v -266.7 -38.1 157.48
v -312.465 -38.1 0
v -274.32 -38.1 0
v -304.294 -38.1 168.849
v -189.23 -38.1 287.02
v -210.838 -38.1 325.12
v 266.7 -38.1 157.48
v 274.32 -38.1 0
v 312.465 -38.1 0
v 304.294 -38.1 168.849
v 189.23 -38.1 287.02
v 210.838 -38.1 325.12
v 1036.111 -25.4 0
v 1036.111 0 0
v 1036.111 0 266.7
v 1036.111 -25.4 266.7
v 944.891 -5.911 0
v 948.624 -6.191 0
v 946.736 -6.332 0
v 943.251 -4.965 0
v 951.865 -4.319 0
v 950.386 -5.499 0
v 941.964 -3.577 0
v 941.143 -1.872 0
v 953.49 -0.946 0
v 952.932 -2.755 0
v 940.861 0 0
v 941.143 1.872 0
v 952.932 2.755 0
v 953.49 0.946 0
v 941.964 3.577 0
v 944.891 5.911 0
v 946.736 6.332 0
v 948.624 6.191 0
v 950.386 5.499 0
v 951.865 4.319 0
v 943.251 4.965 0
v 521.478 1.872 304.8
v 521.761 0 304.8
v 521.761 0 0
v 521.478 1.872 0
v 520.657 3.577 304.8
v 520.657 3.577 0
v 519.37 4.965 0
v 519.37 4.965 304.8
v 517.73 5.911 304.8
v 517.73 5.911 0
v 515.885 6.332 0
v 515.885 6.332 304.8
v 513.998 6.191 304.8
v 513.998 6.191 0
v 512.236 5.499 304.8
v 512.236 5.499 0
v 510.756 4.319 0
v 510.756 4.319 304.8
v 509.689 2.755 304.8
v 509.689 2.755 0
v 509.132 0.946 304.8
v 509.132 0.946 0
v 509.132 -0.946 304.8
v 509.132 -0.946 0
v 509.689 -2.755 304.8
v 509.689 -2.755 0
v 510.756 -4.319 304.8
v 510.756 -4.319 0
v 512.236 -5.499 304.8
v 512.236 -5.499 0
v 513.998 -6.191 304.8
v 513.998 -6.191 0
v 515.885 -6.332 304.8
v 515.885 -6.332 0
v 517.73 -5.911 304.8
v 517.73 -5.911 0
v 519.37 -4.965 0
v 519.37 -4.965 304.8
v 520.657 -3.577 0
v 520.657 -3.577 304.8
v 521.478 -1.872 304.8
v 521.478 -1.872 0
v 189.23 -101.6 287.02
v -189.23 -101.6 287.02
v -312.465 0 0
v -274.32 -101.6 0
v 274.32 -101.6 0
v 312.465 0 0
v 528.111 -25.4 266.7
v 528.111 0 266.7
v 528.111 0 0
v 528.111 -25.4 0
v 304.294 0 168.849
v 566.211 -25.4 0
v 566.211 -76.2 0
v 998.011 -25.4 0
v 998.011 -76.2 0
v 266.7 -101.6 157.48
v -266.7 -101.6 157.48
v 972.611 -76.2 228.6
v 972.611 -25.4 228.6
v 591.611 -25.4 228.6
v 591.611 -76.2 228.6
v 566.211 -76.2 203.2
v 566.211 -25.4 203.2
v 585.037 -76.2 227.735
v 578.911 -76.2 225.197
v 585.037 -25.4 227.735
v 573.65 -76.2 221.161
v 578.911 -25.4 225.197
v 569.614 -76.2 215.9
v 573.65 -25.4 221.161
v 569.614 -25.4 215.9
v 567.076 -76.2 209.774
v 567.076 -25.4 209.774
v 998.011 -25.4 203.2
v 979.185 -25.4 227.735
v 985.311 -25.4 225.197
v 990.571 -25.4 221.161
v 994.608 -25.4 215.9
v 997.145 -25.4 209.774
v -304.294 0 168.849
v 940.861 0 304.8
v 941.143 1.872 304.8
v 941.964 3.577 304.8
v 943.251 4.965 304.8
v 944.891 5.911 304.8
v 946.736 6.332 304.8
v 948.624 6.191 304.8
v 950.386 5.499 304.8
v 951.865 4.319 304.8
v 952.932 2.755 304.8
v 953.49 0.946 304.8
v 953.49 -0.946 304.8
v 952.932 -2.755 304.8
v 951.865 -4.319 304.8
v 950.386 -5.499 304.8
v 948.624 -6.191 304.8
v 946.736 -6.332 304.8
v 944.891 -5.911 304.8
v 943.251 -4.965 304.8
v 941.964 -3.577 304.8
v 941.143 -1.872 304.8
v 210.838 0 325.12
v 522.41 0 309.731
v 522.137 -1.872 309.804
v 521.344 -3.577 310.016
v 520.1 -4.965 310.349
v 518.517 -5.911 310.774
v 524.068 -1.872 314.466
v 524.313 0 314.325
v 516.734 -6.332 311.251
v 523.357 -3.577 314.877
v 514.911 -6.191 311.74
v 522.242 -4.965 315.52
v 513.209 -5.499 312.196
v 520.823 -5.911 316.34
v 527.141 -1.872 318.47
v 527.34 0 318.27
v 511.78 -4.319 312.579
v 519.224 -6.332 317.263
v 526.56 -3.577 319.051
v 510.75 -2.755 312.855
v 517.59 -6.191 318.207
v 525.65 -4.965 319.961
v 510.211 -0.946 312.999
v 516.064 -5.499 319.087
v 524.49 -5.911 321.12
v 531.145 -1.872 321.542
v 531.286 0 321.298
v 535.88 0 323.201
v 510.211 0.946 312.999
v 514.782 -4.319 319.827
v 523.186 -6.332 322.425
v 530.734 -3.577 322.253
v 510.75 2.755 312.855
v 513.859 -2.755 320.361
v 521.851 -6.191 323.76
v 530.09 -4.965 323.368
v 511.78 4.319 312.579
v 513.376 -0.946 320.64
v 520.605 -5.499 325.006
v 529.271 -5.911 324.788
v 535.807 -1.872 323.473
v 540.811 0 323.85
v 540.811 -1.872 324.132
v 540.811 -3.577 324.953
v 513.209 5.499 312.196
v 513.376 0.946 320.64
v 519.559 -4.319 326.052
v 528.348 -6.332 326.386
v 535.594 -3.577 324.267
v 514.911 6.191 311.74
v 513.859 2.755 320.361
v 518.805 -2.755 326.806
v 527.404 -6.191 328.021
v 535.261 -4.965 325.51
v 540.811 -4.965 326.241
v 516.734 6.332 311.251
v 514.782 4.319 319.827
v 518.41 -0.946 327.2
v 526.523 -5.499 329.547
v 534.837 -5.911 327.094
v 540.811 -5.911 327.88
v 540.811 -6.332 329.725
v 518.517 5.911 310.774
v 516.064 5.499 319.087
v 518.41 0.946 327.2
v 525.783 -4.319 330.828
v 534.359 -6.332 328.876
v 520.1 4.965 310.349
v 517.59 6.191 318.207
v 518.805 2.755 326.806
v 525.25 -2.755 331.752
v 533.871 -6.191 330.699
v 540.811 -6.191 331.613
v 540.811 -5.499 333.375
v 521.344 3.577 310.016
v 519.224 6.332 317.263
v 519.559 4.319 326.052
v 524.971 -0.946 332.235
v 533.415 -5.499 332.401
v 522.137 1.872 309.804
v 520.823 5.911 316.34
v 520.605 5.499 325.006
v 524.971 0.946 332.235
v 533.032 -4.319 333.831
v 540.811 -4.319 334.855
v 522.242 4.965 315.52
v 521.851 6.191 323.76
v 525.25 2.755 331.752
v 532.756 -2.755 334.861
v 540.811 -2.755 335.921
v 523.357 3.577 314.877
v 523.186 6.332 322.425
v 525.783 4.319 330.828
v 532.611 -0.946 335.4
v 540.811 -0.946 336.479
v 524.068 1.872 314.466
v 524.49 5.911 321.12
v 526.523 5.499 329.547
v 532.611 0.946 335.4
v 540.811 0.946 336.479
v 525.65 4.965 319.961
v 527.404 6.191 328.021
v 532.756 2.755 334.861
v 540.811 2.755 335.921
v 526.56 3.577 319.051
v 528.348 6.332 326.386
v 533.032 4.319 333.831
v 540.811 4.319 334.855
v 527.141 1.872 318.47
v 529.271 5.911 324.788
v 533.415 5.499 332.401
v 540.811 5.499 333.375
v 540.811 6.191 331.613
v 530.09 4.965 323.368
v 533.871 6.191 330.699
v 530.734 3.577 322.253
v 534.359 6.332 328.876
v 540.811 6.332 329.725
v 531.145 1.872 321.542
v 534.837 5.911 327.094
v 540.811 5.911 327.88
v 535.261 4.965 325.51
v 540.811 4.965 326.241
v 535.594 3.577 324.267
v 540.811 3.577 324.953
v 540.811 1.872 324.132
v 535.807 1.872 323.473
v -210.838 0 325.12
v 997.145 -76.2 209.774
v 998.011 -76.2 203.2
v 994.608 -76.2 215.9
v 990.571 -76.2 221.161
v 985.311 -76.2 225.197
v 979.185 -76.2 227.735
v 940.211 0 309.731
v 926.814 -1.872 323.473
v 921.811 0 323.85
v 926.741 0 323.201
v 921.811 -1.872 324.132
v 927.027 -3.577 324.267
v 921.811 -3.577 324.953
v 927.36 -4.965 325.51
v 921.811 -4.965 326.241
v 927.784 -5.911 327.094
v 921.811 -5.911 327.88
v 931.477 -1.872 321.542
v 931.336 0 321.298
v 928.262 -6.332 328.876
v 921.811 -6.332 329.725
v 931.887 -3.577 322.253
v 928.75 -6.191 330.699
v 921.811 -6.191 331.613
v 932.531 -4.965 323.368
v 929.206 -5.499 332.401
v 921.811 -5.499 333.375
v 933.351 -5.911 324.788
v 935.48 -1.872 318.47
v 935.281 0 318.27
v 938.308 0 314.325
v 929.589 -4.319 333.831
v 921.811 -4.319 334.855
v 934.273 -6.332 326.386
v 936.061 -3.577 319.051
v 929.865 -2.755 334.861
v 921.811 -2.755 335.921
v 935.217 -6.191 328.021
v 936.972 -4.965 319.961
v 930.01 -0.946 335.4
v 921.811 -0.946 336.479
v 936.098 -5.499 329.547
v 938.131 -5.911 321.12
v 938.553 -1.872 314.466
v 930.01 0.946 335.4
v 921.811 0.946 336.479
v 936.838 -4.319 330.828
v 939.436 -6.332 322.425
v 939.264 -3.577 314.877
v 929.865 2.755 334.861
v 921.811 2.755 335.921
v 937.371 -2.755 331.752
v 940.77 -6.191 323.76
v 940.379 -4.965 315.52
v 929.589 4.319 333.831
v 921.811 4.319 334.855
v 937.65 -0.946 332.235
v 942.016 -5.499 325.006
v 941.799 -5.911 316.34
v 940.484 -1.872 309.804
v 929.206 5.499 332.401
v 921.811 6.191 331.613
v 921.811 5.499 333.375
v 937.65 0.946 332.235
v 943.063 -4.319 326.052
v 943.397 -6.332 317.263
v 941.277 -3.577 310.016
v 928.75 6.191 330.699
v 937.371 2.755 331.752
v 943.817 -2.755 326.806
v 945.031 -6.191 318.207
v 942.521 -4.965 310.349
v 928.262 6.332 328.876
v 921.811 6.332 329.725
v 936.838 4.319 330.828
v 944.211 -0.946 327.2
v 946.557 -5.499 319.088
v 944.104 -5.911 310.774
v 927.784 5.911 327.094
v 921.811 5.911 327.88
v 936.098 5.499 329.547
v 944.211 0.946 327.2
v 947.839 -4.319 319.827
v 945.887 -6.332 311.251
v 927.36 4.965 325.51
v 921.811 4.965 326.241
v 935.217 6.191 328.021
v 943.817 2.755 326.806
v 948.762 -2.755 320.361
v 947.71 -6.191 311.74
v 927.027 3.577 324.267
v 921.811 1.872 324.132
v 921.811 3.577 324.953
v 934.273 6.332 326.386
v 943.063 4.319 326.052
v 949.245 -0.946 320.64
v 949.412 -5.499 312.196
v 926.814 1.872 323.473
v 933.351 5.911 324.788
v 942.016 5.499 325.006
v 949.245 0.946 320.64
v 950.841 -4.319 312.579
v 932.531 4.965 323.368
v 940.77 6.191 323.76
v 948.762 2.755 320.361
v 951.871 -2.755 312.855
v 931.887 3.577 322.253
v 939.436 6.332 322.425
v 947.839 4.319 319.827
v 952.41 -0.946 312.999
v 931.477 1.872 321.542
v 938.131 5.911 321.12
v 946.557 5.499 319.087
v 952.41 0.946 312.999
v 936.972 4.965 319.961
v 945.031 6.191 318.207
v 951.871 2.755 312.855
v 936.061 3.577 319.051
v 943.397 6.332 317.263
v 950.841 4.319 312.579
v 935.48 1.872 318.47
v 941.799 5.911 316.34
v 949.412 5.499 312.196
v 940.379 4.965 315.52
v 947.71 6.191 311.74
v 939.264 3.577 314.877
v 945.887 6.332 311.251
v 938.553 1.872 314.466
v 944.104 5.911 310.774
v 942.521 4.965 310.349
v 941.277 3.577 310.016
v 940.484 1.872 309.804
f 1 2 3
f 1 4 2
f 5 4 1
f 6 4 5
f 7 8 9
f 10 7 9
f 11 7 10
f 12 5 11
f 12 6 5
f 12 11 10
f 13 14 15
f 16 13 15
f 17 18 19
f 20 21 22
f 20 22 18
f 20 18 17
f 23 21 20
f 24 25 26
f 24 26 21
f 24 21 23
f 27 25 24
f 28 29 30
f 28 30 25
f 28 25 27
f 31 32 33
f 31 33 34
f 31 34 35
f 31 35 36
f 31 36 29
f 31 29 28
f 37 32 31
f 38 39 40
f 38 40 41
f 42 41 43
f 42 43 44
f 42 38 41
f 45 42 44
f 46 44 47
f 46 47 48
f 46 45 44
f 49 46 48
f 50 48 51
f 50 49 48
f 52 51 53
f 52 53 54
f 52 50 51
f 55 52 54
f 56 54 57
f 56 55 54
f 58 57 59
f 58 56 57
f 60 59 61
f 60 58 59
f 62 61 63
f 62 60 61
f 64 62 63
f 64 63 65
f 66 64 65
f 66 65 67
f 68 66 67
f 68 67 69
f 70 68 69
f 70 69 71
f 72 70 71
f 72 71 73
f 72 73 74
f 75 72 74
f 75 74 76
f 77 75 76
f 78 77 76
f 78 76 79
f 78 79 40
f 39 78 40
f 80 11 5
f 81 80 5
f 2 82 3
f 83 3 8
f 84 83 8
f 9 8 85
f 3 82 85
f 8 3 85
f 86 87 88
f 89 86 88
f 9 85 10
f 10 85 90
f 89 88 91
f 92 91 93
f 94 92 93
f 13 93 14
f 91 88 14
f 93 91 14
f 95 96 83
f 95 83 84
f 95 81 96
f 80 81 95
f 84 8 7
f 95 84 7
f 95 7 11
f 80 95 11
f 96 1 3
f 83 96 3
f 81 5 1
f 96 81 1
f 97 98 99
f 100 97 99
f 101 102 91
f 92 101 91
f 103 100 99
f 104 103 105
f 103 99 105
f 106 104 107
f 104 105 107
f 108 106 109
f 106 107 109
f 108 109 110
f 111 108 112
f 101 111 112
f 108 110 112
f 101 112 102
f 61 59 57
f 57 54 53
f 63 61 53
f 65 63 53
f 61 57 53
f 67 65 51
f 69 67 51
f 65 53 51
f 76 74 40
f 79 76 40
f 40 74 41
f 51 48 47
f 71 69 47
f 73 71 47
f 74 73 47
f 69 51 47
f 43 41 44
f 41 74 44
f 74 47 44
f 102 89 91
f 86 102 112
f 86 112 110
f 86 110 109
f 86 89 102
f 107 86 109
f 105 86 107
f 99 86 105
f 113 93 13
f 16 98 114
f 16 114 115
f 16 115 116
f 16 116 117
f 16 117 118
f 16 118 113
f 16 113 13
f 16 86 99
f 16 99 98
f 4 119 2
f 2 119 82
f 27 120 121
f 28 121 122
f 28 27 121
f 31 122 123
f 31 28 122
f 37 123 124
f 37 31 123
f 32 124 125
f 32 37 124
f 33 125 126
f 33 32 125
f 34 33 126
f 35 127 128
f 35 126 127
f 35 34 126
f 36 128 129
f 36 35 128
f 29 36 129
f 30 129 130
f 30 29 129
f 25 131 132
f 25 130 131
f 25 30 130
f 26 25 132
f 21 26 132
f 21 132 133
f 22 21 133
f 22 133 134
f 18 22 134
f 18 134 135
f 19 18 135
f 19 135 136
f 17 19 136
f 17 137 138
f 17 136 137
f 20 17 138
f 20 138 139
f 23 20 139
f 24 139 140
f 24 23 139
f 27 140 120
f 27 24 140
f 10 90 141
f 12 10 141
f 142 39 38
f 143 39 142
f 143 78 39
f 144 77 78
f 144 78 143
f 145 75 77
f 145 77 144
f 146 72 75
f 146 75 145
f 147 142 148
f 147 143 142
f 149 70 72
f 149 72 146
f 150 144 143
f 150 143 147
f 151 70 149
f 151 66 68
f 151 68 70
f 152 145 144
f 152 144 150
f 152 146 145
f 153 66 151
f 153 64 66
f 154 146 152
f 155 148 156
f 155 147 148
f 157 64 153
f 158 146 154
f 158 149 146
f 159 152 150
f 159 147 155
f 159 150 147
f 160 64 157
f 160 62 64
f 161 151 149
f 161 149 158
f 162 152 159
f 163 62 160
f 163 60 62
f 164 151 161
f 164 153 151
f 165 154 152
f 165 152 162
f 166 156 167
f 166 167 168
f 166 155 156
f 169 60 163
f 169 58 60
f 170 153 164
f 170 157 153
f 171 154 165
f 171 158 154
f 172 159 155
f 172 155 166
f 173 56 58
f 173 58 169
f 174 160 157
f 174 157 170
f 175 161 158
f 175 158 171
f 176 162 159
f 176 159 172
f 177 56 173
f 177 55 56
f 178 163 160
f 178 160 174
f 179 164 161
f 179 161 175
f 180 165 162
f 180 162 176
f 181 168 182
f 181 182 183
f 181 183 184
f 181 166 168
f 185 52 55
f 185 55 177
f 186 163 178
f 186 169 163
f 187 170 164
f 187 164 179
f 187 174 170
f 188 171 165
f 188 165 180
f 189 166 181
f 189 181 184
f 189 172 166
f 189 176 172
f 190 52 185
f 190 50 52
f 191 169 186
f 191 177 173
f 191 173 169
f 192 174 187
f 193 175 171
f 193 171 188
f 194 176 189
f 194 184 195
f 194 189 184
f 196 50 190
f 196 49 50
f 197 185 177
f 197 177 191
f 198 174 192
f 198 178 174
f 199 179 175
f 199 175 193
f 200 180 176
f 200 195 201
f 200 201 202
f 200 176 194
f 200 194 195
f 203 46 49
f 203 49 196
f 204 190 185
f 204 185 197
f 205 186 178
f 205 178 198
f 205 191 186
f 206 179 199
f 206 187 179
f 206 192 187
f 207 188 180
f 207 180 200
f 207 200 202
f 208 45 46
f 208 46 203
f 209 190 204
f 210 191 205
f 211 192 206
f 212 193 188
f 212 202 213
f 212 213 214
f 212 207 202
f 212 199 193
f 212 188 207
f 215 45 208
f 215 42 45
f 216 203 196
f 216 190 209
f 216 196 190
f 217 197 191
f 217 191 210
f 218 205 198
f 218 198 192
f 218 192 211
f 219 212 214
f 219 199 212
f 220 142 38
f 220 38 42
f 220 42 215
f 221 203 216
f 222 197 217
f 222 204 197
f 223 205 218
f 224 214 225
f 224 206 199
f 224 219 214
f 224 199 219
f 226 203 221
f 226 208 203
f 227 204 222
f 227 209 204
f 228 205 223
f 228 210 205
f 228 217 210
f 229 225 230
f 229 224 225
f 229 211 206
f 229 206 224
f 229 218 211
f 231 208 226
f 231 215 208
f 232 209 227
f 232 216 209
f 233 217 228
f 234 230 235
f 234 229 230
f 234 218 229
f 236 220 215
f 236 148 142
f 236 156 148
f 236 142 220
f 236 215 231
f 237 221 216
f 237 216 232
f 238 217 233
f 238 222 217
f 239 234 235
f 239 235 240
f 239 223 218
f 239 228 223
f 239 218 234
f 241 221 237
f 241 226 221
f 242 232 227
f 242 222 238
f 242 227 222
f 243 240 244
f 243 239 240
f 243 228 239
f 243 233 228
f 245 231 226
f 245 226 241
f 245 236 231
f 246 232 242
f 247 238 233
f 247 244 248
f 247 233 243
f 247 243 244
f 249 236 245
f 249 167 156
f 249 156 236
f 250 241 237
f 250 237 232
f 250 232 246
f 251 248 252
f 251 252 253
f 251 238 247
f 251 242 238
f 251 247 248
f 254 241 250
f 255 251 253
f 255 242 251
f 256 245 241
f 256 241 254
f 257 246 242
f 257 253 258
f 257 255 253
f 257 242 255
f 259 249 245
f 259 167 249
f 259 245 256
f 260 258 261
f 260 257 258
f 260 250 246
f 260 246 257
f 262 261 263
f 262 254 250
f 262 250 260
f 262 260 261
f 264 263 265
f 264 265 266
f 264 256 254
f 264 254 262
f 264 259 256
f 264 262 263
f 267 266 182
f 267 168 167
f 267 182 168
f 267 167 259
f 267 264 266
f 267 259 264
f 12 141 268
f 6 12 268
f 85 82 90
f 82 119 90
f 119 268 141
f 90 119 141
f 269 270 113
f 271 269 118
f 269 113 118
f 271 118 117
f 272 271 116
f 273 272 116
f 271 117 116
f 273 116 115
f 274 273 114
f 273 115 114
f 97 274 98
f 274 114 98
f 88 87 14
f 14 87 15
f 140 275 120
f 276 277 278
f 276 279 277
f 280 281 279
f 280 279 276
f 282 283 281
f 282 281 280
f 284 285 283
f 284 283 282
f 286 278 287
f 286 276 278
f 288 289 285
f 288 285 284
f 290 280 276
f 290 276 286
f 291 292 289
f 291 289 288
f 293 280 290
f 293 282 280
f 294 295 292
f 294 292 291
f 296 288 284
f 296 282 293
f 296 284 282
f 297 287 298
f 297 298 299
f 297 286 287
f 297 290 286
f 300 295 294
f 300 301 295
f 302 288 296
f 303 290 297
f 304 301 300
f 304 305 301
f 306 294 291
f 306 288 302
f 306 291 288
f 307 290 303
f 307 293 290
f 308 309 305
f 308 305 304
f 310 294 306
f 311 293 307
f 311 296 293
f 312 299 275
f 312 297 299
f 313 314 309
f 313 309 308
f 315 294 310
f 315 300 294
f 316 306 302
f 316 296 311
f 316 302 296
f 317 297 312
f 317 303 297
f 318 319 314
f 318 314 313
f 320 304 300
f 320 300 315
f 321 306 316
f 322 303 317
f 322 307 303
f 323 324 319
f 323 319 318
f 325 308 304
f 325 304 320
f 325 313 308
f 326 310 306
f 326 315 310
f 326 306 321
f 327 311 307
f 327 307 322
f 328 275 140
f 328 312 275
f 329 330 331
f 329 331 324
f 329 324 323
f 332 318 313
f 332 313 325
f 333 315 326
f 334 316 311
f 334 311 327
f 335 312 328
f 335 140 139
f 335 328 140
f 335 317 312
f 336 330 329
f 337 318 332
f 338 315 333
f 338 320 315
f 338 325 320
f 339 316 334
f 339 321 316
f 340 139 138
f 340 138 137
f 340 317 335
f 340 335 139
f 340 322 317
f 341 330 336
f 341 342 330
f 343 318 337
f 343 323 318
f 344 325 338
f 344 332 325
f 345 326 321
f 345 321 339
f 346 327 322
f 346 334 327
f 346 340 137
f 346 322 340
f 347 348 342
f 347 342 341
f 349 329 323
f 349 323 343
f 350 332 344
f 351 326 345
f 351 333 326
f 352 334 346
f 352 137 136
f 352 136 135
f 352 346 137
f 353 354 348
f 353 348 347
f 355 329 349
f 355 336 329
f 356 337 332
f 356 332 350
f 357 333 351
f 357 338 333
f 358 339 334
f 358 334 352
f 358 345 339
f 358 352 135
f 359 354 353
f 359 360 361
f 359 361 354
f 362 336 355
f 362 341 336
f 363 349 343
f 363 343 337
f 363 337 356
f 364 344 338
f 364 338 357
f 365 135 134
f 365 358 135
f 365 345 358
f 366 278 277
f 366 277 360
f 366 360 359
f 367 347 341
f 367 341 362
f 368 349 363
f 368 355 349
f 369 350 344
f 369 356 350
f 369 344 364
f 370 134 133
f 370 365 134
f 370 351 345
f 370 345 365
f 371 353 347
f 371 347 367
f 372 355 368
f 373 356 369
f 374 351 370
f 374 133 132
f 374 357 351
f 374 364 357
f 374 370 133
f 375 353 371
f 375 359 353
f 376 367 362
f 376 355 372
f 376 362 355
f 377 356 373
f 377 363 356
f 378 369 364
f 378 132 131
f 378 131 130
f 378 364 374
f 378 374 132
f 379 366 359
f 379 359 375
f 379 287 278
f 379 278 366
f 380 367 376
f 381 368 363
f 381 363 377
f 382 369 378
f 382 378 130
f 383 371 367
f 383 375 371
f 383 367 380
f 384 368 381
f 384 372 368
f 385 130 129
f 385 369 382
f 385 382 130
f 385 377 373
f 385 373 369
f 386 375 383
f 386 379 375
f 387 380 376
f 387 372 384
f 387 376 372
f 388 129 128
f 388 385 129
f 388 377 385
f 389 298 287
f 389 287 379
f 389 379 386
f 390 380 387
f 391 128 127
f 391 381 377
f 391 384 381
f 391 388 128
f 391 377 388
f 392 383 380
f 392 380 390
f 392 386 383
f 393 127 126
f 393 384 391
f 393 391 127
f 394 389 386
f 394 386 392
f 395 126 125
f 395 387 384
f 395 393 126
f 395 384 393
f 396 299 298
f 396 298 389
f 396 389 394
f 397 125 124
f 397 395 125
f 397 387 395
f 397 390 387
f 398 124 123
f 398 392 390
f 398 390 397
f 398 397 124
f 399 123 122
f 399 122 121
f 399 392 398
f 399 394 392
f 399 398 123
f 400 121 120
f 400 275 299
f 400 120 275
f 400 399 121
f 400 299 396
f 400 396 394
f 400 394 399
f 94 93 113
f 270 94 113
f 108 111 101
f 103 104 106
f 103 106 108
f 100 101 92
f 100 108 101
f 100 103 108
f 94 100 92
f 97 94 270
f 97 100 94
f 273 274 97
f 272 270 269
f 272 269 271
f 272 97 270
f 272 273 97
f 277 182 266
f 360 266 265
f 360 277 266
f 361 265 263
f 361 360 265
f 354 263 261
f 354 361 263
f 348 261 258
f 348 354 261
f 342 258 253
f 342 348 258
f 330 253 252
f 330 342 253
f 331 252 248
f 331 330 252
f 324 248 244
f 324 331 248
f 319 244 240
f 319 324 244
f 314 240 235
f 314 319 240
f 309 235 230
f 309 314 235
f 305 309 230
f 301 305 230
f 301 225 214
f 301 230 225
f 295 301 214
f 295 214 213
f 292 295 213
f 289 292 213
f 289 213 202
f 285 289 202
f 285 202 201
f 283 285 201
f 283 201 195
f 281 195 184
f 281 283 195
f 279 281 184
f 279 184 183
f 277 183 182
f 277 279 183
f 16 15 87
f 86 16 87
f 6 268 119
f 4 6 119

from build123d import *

# Parameters (mm, degrees)
F1_DEPTH = 101.6
F2_DEPTH = 38.1
F3_DEPTH = 25.4
F4_DEPTH = 76.2
F6_R     = 6.35


with BuildPart() as f1:
    # F0 (on Front) → F1 (new body)
    with BuildSketch(Plane.XZ):
        Polygon((-266.7, 157.48), (-274.32, 0), (0, 0), (274.32, 0), (266.7, 157.48), (189.23, 287.02), (-189.23, 287.02), align=None)
    extrude(amount=F1_DEPTH)

    # F0 (on Front) → F2 (join)
    with BuildSketch(Plane.XZ):
        Polygon((-312.4645759008, 0), (-274.32, 0), (-266.7, 157.48), (-189.23, 287.02), (189.23, 287.02), (266.7, 157.48), (274.32, 0), (312.4645759008, 0), (304.2944724208, 168.8488052545), (210.8381696808, 325.12), (-210.8381696808, 325.12), (-304.2944724208, 168.8488052545), align=None)
    extrude(amount=F2_DEPTH)


with BuildPart() as f3:
    # F0 (on Front) → F3 (new body)
    with BuildSketch(Plane.XZ):
        with BuildLine():
            Line((528.1105759008, 0), (566.2105759008, 0))
            Line((566.2105759008, 0), (566.2105759008, 203.2))
            ThreePointArc((566.2105759008, 203.2), (573.6500636587, 221.1605122421), (591.6105759008, 228.6))
            Line((591.6105759008, 228.6), (972.6105759008, 228.6))
            ThreePointArc((972.6105759008, 228.6), (990.571088143, 221.1605122421), (998.0105759008, 203.2))
            Line((998.0105759008, 203.2), (998.0105759008, 0))
            Line((998.0105759008, 0), (1036.1105759008, 0))
            Line((1036.1105759008, 0), (1036.1105759008, 266.7))
            Line((1036.1105759008, 266.7), (528.1105759008, 266.7))
            Line((528.1105759008, 266.7), (528.1105759008, 0))
        make_face()
    extrude(amount=F3_DEPTH)

    # F0 (on Front) → F4 (join)
    with BuildSketch(Plane.XZ):
        with BuildLine():
            Line((566.2105759008, 203.2), (566.2105759008, 0))
            Line((566.2105759008, 0), (998.0105759008, 0))
            Line((998.0105759008, 0), (998.0105759008, 203.2))
            ThreePointArc((998.0105759008, 203.2), (990.571088143, 221.1605122421), (972.6105759008, 228.6))
            Line((972.6105759008, 228.6), (591.6105759008, 228.6))
            ThreePointArc((591.6105759008, 228.6), (573.6500636587, 221.1605122421), (566.2105759008, 203.2))
        make_face()
    extrude(amount=F4_DEPTH)


with BuildPart() as f7:
    # F7: sweep along a path in F5
    with BuildLine(Plane(origin=(0, 0, 0), x_dir=(-1, 0, 0), z_dir=(0, 1, 0))) as f7_path:
        Line((-515.4105759008, 0), (-515.4105759008, 101.6))
        Line((-515.4105759008, 101.6), (-515.4105759008, 304.8))
        ThreePointArc((-515.4105759008, 304.8), (-522.8500636587, 322.7605122421), (-540.8105759008, 330.2))
        Line((-540.8105759008, 330.2), (-921.8105759008, 330.2))
        ThreePointArc((-921.8105759008, 330.2), (-939.771088143, 322.7605122421), (-947.2105759008, 304.8))
        Line((-947.2105759008, 304.8), (-947.2105759008, 101.6))
        Line((-947.2105759008, 101.6), (-947.2105759008, 0))
    # F6 (on Top) → F7 (sweep)
    with BuildSketch(Plane.XY):
        with Locations((515.4105759008, 0)):
            Circle(F6_R)
    sweep(path=f7_path.line)


solid = Compound([f1.part, f3.part, f7.part])
